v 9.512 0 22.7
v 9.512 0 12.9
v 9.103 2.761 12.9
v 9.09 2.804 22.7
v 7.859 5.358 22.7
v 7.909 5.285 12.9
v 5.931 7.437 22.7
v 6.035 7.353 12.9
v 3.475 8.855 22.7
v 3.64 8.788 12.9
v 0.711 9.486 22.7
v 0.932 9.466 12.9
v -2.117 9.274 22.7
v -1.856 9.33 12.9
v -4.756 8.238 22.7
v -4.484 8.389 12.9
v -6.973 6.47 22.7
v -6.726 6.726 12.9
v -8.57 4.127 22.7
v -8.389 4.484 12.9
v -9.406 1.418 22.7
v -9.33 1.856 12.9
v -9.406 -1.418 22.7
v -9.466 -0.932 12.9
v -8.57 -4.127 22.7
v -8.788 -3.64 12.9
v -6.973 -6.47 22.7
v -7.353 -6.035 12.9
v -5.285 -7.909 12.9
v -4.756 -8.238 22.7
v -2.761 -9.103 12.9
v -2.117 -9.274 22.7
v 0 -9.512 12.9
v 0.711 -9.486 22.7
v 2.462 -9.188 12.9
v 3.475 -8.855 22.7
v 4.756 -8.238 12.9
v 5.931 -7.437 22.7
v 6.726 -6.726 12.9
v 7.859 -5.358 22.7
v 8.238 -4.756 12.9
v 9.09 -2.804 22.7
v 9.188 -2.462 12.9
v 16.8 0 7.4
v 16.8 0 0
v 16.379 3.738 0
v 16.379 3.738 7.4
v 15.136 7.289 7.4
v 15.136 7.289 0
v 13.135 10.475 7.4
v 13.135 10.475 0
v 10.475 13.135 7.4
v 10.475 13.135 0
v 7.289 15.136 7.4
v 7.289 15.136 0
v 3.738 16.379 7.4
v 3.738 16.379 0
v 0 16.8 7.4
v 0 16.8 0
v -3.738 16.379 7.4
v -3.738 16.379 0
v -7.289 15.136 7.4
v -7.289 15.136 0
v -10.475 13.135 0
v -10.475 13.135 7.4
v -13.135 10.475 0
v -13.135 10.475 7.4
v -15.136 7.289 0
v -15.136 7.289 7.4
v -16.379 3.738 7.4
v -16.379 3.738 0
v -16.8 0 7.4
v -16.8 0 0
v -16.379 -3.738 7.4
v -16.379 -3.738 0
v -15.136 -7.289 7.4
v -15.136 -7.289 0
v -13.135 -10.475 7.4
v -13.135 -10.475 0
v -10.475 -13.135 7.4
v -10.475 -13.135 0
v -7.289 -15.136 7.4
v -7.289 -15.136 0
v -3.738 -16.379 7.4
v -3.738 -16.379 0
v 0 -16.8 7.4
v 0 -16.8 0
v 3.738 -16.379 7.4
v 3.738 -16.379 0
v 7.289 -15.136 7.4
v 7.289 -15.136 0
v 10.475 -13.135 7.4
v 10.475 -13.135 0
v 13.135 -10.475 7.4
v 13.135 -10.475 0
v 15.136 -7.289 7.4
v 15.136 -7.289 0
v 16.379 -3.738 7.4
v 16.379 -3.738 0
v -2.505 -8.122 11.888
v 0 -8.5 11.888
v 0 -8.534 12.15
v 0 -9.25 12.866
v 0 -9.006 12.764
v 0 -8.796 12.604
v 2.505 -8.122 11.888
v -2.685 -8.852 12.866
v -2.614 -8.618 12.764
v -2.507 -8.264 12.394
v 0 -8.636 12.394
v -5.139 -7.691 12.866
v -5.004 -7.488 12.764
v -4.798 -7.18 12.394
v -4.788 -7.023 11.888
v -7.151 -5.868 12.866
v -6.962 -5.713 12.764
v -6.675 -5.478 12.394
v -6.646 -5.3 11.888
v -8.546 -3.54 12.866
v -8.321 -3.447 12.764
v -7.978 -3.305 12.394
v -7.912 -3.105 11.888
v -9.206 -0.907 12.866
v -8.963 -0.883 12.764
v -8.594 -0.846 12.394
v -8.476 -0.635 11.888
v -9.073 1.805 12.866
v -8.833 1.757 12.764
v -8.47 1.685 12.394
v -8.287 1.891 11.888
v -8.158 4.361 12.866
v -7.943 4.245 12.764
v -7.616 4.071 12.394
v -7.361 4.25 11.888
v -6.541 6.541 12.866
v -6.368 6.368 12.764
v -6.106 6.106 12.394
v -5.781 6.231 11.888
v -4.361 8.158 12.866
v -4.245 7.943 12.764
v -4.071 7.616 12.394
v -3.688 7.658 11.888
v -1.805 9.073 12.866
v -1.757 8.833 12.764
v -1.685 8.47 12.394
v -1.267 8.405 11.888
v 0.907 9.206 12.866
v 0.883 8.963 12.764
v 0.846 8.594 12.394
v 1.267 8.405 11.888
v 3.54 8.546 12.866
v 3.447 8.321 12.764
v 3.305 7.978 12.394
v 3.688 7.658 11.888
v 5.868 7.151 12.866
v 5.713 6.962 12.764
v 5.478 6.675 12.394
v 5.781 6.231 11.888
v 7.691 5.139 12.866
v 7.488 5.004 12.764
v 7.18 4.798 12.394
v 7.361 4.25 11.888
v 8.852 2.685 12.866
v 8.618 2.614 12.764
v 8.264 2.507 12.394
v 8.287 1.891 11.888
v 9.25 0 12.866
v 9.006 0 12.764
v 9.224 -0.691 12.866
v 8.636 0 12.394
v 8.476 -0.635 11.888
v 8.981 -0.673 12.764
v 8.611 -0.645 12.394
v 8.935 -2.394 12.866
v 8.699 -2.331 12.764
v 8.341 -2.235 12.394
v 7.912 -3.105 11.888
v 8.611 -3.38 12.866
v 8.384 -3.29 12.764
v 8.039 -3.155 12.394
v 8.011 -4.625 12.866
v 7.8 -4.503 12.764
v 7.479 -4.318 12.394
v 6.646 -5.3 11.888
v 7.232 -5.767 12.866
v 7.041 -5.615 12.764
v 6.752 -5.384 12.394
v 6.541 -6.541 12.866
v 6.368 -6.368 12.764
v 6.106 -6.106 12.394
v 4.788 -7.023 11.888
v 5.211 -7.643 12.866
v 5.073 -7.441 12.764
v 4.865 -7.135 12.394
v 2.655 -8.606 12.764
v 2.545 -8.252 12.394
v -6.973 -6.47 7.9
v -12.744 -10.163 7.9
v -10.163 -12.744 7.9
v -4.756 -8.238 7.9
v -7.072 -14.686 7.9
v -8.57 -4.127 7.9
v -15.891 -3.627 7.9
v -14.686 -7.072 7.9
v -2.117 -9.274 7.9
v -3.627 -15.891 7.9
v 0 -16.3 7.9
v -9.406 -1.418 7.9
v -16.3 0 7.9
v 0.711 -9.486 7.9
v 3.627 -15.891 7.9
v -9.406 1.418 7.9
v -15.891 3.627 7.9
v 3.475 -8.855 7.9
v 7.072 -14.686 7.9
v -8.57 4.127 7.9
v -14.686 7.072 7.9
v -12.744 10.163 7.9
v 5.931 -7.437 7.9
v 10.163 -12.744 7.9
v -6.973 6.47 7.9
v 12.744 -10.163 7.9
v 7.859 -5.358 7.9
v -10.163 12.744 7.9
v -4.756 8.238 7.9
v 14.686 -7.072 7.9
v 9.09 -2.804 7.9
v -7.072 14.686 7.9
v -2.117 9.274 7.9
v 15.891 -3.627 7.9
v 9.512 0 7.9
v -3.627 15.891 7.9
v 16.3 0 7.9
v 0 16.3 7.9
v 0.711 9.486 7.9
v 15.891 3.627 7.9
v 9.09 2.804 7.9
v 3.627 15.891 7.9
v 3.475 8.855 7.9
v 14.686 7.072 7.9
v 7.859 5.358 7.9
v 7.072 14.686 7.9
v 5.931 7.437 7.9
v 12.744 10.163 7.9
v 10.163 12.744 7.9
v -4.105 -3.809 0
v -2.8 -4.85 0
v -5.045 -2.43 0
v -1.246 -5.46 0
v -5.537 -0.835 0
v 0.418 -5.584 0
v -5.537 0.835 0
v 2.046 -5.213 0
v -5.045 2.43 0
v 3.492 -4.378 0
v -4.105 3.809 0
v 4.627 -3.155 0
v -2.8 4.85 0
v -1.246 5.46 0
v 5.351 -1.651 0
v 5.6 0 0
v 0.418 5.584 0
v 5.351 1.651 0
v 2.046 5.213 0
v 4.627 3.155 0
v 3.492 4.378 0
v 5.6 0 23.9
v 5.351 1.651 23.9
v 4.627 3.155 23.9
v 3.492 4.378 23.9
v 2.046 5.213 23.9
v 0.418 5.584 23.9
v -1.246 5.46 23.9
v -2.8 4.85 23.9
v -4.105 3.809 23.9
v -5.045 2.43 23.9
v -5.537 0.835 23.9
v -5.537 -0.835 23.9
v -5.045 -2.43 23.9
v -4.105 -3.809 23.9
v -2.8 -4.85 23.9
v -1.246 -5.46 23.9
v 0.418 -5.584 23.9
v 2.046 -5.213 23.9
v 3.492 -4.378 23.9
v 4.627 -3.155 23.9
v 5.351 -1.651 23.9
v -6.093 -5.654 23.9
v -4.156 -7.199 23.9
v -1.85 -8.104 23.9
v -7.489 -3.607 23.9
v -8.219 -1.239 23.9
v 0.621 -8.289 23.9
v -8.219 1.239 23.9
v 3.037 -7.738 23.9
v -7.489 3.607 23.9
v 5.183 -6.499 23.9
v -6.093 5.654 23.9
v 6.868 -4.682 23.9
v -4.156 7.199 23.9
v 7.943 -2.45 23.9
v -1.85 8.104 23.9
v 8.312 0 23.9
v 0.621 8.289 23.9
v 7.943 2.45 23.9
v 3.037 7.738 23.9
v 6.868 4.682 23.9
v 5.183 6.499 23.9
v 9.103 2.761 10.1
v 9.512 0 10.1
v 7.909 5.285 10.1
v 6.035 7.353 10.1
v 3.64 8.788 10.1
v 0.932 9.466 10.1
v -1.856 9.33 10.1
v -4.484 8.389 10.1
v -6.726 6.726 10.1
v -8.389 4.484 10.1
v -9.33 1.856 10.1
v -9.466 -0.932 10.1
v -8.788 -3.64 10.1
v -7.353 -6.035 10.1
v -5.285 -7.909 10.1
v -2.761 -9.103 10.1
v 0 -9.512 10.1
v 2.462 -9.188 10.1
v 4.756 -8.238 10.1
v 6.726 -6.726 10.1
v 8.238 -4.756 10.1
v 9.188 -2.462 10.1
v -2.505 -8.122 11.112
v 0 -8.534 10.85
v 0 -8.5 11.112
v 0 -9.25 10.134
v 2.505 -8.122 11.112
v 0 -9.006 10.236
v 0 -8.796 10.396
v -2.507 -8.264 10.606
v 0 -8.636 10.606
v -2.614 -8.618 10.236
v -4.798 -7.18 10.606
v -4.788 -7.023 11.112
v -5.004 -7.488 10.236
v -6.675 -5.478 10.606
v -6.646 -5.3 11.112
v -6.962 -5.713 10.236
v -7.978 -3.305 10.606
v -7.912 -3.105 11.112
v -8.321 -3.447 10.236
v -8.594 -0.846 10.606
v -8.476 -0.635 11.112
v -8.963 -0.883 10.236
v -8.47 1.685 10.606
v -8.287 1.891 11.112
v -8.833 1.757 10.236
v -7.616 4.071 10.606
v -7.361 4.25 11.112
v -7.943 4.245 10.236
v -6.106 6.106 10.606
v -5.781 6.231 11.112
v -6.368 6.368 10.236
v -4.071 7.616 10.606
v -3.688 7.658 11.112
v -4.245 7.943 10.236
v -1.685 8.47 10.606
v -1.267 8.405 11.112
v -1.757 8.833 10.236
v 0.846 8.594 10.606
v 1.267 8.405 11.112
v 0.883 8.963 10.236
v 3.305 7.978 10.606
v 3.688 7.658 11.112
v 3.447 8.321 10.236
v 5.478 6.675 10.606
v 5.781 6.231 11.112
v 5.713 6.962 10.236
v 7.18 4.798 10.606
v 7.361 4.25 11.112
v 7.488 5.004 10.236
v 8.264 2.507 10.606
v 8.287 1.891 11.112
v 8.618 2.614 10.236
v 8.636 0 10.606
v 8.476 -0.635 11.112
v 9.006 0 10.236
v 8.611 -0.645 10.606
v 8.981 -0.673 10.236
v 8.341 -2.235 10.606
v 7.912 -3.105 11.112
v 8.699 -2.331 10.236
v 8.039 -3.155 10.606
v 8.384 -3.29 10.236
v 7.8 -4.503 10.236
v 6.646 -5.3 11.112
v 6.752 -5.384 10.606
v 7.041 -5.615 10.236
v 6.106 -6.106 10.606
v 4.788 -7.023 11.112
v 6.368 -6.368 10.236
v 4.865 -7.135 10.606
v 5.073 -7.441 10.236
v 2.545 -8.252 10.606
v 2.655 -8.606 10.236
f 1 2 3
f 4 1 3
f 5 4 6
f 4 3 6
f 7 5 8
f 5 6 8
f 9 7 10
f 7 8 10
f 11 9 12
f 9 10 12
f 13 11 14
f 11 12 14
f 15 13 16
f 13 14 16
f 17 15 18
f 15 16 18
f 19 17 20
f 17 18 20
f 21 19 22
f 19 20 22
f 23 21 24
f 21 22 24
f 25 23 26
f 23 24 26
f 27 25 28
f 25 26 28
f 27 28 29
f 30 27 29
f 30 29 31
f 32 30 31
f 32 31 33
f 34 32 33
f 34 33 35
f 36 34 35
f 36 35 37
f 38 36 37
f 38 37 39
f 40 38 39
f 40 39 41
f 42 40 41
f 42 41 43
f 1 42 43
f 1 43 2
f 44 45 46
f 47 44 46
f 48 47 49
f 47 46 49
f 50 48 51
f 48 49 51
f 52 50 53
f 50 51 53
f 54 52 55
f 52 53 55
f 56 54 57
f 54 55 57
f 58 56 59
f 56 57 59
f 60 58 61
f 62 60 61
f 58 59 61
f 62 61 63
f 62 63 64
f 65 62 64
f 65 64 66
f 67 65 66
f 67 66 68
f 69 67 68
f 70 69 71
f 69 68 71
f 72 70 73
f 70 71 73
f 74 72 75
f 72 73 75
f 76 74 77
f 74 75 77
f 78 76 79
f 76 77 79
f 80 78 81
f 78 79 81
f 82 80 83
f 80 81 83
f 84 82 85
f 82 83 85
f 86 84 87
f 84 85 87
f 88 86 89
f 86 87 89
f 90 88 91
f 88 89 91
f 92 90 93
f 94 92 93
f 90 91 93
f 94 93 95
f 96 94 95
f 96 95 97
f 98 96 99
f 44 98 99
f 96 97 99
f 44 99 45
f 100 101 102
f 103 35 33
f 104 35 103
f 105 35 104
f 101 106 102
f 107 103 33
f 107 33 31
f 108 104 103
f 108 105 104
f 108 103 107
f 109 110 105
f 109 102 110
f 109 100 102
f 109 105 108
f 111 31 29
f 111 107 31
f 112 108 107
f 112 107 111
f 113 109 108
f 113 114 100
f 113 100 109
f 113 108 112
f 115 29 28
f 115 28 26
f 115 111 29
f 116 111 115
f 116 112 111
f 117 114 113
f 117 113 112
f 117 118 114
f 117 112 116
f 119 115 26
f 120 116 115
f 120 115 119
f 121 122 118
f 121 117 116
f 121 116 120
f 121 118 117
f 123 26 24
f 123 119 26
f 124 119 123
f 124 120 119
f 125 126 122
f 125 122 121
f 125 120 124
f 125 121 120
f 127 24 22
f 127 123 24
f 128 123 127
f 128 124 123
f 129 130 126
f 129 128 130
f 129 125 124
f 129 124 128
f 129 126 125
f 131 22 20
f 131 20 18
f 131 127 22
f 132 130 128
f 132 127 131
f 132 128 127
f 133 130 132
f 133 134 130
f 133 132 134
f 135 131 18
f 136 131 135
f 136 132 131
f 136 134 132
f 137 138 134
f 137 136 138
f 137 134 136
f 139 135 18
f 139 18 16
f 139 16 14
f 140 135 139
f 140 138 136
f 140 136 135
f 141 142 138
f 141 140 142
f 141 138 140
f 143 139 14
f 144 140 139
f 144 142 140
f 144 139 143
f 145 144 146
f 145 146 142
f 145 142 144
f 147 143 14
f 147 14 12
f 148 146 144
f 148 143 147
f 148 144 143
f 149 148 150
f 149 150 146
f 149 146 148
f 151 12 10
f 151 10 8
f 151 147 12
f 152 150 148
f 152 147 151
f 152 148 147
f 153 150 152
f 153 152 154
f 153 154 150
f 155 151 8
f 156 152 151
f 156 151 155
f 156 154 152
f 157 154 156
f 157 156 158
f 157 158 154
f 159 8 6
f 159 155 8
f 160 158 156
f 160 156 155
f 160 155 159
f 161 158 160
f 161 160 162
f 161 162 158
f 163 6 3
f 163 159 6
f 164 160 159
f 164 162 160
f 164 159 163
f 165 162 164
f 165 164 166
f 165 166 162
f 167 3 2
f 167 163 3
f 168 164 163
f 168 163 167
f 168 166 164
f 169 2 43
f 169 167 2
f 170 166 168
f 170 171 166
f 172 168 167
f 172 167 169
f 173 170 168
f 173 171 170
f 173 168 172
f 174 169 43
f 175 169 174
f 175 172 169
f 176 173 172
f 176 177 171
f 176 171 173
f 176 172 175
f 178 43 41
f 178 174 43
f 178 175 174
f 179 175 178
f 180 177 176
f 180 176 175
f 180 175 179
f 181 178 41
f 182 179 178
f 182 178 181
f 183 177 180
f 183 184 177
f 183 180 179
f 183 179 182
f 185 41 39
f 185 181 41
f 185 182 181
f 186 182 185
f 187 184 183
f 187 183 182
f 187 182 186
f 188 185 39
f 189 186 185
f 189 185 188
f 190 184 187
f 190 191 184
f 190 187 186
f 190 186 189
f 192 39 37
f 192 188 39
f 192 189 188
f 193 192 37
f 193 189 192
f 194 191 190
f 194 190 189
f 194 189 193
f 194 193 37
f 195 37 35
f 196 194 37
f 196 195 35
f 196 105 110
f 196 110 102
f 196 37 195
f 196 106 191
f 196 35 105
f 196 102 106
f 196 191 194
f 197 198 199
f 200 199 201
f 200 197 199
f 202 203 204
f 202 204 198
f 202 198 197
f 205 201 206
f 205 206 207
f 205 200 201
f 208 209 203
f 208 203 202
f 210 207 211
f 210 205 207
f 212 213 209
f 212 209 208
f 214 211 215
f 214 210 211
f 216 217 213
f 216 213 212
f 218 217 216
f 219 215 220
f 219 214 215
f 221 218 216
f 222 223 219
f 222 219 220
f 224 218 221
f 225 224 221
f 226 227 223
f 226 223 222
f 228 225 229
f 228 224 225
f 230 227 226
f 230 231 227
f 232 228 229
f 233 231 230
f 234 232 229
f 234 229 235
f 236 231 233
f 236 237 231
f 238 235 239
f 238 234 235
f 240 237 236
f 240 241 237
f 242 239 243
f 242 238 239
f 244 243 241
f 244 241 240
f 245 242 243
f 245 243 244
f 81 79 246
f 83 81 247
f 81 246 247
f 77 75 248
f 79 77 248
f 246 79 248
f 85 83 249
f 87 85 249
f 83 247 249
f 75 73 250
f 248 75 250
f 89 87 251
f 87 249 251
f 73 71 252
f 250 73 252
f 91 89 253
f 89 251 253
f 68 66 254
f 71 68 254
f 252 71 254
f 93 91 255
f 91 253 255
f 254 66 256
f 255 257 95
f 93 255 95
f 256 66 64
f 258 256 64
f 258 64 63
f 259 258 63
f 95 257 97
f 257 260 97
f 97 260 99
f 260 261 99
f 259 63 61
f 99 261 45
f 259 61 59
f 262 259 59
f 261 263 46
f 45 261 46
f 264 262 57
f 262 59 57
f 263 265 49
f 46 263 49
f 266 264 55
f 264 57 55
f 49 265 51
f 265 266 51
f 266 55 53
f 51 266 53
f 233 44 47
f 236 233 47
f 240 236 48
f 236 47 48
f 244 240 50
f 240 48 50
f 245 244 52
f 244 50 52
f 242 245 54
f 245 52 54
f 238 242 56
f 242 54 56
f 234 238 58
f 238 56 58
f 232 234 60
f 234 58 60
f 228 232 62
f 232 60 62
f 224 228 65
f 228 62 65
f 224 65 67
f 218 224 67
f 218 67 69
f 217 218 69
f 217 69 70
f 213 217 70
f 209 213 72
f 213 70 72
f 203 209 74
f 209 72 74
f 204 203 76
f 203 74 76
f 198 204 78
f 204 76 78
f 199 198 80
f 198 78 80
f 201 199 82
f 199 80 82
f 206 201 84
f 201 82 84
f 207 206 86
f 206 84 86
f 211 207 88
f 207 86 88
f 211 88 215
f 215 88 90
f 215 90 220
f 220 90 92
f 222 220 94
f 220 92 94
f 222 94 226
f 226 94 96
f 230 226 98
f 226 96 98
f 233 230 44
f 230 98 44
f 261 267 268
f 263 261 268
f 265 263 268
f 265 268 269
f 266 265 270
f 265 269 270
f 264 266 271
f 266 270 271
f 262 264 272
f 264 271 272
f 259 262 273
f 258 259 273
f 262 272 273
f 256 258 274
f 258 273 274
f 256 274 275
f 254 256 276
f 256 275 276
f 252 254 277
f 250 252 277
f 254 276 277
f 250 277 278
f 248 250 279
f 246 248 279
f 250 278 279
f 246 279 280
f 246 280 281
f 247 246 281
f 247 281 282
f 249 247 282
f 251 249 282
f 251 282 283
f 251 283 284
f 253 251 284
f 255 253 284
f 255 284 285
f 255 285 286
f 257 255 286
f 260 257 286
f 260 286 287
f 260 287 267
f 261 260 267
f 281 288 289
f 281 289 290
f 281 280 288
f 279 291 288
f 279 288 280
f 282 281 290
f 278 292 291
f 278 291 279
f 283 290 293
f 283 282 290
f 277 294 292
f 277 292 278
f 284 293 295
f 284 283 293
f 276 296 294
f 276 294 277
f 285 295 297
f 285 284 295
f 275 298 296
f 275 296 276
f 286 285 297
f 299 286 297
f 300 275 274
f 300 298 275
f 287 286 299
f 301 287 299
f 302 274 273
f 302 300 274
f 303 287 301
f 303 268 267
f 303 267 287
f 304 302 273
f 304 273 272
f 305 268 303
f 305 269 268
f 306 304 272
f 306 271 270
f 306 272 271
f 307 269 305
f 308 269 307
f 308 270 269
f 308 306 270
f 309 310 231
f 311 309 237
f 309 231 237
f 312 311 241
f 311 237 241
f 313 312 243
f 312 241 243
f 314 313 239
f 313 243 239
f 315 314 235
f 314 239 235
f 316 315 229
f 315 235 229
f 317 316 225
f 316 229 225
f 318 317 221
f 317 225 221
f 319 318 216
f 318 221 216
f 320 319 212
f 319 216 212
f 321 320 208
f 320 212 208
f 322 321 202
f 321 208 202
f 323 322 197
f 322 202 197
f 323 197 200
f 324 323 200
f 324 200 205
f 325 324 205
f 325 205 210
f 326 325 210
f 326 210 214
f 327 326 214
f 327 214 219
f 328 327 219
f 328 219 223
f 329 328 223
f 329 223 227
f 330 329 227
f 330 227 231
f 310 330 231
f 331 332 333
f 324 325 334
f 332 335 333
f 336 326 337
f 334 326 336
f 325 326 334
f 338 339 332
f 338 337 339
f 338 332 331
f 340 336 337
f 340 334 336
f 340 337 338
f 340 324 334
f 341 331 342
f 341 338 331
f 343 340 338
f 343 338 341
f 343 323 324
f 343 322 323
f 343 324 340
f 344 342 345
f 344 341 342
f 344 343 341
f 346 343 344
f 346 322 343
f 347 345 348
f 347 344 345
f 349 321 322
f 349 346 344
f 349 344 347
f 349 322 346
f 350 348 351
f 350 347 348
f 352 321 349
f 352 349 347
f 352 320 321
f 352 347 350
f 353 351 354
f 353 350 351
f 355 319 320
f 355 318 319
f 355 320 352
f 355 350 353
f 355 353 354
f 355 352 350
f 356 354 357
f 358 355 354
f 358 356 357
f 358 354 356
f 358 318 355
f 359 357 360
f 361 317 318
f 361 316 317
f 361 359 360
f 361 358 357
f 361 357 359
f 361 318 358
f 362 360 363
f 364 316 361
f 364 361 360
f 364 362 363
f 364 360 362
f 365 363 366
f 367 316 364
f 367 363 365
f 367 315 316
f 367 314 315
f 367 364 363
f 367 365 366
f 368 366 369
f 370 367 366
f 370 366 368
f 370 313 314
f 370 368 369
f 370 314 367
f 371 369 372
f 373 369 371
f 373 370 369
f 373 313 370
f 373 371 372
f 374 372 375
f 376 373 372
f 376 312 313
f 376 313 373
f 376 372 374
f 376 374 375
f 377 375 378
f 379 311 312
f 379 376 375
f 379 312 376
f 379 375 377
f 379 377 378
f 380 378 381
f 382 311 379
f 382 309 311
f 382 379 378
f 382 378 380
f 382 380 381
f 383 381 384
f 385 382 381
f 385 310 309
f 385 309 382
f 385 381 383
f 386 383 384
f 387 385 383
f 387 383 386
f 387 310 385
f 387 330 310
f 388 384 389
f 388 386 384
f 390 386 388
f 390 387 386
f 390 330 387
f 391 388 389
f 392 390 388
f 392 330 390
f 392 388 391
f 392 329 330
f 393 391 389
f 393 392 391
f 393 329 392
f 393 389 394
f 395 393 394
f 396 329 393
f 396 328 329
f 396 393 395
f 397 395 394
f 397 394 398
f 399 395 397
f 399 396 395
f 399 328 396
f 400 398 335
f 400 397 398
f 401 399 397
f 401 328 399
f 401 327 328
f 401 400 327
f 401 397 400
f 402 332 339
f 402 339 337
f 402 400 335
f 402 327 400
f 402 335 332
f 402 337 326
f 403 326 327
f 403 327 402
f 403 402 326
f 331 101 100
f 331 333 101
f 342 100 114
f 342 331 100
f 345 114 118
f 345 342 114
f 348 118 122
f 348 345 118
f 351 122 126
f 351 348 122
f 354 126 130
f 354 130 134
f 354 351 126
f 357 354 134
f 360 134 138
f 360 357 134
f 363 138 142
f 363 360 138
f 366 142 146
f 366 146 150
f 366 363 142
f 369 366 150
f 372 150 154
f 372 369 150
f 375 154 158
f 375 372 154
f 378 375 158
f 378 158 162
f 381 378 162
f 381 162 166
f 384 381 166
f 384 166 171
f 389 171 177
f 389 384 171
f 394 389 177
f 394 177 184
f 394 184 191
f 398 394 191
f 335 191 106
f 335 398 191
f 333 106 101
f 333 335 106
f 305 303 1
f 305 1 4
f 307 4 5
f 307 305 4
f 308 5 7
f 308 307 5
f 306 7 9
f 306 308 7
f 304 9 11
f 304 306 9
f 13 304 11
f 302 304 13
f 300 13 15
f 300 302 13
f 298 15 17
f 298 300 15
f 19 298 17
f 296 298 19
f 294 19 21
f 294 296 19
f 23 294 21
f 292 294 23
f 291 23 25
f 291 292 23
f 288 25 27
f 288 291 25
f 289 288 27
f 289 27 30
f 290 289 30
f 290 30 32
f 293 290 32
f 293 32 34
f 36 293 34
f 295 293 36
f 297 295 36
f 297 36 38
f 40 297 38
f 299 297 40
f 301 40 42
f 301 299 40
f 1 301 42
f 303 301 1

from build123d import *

# Parameters (mm, degrees)
SKETCH1_R      = 16.8
EXTRUDE1_DEPTH = 7.9
SKETCH2_R      = 9.5123
THREAD_DEPTH   = 16
CHAMFER1_SIZE  = 1.2
CHAMFER2_SIZE  = 0.5
RODHOLE_REACH  = 35.7
SKETCH9_R      = 5.6


with BuildPart() as part:
    # Sketch1 → Extrude1 (new body)
    with BuildSketch(Plane.XY):
        Circle(SKETCH1_R)
    extrude(amount=EXTRUDE1_DEPTH)

    # Sketch2 → THREAD (add)
    with BuildSketch(Plane.XY.offset(7.9)):
        Circle(SKETCH2_R)
    extrude(amount=THREAD_DEPTH)

    # Sketch3 → THREAD END (revolve, cut)
    with BuildSketch(Plane(origin=(0, 0, 0), x_dir=(0, 0, -1), z_dir=(1, 0, 0))):
        with BuildLine():
            Line((-11.8877, 8.5), (-11.1123, 8.5))
            ThreePointArc((-11.1123, 8.5), (-10.396495805, 8.796495805), (-10.1, 9.5123))
            Line((-10.1, 9.5123), (-12.9, 9.5123))
            ThreePointArc((-12.9, 9.5123), (-12.603504195, 8.796495805), (-11.8877, 8.5))
        make_face()
    revolve(axis=Axis((0, 0, 23.9), (0, 0, -1)), mode=Mode.SUBTRACT)

    # Chamfer1
    chamfer1_edges = [part.edges().sort_by_distance(p)[0] for p in [
        (-9.5123, 0, 23.9),
    ]]
    chamfer(chamfer1_edges, length=CHAMFER1_SIZE)

    # Chamfer2
    chamfer2_edges = [part.edges().sort_by_distance(p)[0] for p in [
        (-16.8, 0, 7.9),
    ]]
    chamfer(chamfer2_edges, length=CHAMFER2_SIZE)

    # Sketch9 → RodHole (cut, up to next)
    with BuildSketch(Plane.XY.offset(23.9), mode=Mode.PRIVATE) as rodhole_sk1:
        Circle(SKETCH9_R)
    rodhole_tool1 = extrude(rodhole_sk1.sketch, amount=-RODHOLE_REACH, mode=Mode.PRIVATE) & part.part
    add(rodhole_tool1.solids().sort_by_distance((0, 0, 23.9))[0], mode=Mode.SUBTRACT)


solid = part.part
